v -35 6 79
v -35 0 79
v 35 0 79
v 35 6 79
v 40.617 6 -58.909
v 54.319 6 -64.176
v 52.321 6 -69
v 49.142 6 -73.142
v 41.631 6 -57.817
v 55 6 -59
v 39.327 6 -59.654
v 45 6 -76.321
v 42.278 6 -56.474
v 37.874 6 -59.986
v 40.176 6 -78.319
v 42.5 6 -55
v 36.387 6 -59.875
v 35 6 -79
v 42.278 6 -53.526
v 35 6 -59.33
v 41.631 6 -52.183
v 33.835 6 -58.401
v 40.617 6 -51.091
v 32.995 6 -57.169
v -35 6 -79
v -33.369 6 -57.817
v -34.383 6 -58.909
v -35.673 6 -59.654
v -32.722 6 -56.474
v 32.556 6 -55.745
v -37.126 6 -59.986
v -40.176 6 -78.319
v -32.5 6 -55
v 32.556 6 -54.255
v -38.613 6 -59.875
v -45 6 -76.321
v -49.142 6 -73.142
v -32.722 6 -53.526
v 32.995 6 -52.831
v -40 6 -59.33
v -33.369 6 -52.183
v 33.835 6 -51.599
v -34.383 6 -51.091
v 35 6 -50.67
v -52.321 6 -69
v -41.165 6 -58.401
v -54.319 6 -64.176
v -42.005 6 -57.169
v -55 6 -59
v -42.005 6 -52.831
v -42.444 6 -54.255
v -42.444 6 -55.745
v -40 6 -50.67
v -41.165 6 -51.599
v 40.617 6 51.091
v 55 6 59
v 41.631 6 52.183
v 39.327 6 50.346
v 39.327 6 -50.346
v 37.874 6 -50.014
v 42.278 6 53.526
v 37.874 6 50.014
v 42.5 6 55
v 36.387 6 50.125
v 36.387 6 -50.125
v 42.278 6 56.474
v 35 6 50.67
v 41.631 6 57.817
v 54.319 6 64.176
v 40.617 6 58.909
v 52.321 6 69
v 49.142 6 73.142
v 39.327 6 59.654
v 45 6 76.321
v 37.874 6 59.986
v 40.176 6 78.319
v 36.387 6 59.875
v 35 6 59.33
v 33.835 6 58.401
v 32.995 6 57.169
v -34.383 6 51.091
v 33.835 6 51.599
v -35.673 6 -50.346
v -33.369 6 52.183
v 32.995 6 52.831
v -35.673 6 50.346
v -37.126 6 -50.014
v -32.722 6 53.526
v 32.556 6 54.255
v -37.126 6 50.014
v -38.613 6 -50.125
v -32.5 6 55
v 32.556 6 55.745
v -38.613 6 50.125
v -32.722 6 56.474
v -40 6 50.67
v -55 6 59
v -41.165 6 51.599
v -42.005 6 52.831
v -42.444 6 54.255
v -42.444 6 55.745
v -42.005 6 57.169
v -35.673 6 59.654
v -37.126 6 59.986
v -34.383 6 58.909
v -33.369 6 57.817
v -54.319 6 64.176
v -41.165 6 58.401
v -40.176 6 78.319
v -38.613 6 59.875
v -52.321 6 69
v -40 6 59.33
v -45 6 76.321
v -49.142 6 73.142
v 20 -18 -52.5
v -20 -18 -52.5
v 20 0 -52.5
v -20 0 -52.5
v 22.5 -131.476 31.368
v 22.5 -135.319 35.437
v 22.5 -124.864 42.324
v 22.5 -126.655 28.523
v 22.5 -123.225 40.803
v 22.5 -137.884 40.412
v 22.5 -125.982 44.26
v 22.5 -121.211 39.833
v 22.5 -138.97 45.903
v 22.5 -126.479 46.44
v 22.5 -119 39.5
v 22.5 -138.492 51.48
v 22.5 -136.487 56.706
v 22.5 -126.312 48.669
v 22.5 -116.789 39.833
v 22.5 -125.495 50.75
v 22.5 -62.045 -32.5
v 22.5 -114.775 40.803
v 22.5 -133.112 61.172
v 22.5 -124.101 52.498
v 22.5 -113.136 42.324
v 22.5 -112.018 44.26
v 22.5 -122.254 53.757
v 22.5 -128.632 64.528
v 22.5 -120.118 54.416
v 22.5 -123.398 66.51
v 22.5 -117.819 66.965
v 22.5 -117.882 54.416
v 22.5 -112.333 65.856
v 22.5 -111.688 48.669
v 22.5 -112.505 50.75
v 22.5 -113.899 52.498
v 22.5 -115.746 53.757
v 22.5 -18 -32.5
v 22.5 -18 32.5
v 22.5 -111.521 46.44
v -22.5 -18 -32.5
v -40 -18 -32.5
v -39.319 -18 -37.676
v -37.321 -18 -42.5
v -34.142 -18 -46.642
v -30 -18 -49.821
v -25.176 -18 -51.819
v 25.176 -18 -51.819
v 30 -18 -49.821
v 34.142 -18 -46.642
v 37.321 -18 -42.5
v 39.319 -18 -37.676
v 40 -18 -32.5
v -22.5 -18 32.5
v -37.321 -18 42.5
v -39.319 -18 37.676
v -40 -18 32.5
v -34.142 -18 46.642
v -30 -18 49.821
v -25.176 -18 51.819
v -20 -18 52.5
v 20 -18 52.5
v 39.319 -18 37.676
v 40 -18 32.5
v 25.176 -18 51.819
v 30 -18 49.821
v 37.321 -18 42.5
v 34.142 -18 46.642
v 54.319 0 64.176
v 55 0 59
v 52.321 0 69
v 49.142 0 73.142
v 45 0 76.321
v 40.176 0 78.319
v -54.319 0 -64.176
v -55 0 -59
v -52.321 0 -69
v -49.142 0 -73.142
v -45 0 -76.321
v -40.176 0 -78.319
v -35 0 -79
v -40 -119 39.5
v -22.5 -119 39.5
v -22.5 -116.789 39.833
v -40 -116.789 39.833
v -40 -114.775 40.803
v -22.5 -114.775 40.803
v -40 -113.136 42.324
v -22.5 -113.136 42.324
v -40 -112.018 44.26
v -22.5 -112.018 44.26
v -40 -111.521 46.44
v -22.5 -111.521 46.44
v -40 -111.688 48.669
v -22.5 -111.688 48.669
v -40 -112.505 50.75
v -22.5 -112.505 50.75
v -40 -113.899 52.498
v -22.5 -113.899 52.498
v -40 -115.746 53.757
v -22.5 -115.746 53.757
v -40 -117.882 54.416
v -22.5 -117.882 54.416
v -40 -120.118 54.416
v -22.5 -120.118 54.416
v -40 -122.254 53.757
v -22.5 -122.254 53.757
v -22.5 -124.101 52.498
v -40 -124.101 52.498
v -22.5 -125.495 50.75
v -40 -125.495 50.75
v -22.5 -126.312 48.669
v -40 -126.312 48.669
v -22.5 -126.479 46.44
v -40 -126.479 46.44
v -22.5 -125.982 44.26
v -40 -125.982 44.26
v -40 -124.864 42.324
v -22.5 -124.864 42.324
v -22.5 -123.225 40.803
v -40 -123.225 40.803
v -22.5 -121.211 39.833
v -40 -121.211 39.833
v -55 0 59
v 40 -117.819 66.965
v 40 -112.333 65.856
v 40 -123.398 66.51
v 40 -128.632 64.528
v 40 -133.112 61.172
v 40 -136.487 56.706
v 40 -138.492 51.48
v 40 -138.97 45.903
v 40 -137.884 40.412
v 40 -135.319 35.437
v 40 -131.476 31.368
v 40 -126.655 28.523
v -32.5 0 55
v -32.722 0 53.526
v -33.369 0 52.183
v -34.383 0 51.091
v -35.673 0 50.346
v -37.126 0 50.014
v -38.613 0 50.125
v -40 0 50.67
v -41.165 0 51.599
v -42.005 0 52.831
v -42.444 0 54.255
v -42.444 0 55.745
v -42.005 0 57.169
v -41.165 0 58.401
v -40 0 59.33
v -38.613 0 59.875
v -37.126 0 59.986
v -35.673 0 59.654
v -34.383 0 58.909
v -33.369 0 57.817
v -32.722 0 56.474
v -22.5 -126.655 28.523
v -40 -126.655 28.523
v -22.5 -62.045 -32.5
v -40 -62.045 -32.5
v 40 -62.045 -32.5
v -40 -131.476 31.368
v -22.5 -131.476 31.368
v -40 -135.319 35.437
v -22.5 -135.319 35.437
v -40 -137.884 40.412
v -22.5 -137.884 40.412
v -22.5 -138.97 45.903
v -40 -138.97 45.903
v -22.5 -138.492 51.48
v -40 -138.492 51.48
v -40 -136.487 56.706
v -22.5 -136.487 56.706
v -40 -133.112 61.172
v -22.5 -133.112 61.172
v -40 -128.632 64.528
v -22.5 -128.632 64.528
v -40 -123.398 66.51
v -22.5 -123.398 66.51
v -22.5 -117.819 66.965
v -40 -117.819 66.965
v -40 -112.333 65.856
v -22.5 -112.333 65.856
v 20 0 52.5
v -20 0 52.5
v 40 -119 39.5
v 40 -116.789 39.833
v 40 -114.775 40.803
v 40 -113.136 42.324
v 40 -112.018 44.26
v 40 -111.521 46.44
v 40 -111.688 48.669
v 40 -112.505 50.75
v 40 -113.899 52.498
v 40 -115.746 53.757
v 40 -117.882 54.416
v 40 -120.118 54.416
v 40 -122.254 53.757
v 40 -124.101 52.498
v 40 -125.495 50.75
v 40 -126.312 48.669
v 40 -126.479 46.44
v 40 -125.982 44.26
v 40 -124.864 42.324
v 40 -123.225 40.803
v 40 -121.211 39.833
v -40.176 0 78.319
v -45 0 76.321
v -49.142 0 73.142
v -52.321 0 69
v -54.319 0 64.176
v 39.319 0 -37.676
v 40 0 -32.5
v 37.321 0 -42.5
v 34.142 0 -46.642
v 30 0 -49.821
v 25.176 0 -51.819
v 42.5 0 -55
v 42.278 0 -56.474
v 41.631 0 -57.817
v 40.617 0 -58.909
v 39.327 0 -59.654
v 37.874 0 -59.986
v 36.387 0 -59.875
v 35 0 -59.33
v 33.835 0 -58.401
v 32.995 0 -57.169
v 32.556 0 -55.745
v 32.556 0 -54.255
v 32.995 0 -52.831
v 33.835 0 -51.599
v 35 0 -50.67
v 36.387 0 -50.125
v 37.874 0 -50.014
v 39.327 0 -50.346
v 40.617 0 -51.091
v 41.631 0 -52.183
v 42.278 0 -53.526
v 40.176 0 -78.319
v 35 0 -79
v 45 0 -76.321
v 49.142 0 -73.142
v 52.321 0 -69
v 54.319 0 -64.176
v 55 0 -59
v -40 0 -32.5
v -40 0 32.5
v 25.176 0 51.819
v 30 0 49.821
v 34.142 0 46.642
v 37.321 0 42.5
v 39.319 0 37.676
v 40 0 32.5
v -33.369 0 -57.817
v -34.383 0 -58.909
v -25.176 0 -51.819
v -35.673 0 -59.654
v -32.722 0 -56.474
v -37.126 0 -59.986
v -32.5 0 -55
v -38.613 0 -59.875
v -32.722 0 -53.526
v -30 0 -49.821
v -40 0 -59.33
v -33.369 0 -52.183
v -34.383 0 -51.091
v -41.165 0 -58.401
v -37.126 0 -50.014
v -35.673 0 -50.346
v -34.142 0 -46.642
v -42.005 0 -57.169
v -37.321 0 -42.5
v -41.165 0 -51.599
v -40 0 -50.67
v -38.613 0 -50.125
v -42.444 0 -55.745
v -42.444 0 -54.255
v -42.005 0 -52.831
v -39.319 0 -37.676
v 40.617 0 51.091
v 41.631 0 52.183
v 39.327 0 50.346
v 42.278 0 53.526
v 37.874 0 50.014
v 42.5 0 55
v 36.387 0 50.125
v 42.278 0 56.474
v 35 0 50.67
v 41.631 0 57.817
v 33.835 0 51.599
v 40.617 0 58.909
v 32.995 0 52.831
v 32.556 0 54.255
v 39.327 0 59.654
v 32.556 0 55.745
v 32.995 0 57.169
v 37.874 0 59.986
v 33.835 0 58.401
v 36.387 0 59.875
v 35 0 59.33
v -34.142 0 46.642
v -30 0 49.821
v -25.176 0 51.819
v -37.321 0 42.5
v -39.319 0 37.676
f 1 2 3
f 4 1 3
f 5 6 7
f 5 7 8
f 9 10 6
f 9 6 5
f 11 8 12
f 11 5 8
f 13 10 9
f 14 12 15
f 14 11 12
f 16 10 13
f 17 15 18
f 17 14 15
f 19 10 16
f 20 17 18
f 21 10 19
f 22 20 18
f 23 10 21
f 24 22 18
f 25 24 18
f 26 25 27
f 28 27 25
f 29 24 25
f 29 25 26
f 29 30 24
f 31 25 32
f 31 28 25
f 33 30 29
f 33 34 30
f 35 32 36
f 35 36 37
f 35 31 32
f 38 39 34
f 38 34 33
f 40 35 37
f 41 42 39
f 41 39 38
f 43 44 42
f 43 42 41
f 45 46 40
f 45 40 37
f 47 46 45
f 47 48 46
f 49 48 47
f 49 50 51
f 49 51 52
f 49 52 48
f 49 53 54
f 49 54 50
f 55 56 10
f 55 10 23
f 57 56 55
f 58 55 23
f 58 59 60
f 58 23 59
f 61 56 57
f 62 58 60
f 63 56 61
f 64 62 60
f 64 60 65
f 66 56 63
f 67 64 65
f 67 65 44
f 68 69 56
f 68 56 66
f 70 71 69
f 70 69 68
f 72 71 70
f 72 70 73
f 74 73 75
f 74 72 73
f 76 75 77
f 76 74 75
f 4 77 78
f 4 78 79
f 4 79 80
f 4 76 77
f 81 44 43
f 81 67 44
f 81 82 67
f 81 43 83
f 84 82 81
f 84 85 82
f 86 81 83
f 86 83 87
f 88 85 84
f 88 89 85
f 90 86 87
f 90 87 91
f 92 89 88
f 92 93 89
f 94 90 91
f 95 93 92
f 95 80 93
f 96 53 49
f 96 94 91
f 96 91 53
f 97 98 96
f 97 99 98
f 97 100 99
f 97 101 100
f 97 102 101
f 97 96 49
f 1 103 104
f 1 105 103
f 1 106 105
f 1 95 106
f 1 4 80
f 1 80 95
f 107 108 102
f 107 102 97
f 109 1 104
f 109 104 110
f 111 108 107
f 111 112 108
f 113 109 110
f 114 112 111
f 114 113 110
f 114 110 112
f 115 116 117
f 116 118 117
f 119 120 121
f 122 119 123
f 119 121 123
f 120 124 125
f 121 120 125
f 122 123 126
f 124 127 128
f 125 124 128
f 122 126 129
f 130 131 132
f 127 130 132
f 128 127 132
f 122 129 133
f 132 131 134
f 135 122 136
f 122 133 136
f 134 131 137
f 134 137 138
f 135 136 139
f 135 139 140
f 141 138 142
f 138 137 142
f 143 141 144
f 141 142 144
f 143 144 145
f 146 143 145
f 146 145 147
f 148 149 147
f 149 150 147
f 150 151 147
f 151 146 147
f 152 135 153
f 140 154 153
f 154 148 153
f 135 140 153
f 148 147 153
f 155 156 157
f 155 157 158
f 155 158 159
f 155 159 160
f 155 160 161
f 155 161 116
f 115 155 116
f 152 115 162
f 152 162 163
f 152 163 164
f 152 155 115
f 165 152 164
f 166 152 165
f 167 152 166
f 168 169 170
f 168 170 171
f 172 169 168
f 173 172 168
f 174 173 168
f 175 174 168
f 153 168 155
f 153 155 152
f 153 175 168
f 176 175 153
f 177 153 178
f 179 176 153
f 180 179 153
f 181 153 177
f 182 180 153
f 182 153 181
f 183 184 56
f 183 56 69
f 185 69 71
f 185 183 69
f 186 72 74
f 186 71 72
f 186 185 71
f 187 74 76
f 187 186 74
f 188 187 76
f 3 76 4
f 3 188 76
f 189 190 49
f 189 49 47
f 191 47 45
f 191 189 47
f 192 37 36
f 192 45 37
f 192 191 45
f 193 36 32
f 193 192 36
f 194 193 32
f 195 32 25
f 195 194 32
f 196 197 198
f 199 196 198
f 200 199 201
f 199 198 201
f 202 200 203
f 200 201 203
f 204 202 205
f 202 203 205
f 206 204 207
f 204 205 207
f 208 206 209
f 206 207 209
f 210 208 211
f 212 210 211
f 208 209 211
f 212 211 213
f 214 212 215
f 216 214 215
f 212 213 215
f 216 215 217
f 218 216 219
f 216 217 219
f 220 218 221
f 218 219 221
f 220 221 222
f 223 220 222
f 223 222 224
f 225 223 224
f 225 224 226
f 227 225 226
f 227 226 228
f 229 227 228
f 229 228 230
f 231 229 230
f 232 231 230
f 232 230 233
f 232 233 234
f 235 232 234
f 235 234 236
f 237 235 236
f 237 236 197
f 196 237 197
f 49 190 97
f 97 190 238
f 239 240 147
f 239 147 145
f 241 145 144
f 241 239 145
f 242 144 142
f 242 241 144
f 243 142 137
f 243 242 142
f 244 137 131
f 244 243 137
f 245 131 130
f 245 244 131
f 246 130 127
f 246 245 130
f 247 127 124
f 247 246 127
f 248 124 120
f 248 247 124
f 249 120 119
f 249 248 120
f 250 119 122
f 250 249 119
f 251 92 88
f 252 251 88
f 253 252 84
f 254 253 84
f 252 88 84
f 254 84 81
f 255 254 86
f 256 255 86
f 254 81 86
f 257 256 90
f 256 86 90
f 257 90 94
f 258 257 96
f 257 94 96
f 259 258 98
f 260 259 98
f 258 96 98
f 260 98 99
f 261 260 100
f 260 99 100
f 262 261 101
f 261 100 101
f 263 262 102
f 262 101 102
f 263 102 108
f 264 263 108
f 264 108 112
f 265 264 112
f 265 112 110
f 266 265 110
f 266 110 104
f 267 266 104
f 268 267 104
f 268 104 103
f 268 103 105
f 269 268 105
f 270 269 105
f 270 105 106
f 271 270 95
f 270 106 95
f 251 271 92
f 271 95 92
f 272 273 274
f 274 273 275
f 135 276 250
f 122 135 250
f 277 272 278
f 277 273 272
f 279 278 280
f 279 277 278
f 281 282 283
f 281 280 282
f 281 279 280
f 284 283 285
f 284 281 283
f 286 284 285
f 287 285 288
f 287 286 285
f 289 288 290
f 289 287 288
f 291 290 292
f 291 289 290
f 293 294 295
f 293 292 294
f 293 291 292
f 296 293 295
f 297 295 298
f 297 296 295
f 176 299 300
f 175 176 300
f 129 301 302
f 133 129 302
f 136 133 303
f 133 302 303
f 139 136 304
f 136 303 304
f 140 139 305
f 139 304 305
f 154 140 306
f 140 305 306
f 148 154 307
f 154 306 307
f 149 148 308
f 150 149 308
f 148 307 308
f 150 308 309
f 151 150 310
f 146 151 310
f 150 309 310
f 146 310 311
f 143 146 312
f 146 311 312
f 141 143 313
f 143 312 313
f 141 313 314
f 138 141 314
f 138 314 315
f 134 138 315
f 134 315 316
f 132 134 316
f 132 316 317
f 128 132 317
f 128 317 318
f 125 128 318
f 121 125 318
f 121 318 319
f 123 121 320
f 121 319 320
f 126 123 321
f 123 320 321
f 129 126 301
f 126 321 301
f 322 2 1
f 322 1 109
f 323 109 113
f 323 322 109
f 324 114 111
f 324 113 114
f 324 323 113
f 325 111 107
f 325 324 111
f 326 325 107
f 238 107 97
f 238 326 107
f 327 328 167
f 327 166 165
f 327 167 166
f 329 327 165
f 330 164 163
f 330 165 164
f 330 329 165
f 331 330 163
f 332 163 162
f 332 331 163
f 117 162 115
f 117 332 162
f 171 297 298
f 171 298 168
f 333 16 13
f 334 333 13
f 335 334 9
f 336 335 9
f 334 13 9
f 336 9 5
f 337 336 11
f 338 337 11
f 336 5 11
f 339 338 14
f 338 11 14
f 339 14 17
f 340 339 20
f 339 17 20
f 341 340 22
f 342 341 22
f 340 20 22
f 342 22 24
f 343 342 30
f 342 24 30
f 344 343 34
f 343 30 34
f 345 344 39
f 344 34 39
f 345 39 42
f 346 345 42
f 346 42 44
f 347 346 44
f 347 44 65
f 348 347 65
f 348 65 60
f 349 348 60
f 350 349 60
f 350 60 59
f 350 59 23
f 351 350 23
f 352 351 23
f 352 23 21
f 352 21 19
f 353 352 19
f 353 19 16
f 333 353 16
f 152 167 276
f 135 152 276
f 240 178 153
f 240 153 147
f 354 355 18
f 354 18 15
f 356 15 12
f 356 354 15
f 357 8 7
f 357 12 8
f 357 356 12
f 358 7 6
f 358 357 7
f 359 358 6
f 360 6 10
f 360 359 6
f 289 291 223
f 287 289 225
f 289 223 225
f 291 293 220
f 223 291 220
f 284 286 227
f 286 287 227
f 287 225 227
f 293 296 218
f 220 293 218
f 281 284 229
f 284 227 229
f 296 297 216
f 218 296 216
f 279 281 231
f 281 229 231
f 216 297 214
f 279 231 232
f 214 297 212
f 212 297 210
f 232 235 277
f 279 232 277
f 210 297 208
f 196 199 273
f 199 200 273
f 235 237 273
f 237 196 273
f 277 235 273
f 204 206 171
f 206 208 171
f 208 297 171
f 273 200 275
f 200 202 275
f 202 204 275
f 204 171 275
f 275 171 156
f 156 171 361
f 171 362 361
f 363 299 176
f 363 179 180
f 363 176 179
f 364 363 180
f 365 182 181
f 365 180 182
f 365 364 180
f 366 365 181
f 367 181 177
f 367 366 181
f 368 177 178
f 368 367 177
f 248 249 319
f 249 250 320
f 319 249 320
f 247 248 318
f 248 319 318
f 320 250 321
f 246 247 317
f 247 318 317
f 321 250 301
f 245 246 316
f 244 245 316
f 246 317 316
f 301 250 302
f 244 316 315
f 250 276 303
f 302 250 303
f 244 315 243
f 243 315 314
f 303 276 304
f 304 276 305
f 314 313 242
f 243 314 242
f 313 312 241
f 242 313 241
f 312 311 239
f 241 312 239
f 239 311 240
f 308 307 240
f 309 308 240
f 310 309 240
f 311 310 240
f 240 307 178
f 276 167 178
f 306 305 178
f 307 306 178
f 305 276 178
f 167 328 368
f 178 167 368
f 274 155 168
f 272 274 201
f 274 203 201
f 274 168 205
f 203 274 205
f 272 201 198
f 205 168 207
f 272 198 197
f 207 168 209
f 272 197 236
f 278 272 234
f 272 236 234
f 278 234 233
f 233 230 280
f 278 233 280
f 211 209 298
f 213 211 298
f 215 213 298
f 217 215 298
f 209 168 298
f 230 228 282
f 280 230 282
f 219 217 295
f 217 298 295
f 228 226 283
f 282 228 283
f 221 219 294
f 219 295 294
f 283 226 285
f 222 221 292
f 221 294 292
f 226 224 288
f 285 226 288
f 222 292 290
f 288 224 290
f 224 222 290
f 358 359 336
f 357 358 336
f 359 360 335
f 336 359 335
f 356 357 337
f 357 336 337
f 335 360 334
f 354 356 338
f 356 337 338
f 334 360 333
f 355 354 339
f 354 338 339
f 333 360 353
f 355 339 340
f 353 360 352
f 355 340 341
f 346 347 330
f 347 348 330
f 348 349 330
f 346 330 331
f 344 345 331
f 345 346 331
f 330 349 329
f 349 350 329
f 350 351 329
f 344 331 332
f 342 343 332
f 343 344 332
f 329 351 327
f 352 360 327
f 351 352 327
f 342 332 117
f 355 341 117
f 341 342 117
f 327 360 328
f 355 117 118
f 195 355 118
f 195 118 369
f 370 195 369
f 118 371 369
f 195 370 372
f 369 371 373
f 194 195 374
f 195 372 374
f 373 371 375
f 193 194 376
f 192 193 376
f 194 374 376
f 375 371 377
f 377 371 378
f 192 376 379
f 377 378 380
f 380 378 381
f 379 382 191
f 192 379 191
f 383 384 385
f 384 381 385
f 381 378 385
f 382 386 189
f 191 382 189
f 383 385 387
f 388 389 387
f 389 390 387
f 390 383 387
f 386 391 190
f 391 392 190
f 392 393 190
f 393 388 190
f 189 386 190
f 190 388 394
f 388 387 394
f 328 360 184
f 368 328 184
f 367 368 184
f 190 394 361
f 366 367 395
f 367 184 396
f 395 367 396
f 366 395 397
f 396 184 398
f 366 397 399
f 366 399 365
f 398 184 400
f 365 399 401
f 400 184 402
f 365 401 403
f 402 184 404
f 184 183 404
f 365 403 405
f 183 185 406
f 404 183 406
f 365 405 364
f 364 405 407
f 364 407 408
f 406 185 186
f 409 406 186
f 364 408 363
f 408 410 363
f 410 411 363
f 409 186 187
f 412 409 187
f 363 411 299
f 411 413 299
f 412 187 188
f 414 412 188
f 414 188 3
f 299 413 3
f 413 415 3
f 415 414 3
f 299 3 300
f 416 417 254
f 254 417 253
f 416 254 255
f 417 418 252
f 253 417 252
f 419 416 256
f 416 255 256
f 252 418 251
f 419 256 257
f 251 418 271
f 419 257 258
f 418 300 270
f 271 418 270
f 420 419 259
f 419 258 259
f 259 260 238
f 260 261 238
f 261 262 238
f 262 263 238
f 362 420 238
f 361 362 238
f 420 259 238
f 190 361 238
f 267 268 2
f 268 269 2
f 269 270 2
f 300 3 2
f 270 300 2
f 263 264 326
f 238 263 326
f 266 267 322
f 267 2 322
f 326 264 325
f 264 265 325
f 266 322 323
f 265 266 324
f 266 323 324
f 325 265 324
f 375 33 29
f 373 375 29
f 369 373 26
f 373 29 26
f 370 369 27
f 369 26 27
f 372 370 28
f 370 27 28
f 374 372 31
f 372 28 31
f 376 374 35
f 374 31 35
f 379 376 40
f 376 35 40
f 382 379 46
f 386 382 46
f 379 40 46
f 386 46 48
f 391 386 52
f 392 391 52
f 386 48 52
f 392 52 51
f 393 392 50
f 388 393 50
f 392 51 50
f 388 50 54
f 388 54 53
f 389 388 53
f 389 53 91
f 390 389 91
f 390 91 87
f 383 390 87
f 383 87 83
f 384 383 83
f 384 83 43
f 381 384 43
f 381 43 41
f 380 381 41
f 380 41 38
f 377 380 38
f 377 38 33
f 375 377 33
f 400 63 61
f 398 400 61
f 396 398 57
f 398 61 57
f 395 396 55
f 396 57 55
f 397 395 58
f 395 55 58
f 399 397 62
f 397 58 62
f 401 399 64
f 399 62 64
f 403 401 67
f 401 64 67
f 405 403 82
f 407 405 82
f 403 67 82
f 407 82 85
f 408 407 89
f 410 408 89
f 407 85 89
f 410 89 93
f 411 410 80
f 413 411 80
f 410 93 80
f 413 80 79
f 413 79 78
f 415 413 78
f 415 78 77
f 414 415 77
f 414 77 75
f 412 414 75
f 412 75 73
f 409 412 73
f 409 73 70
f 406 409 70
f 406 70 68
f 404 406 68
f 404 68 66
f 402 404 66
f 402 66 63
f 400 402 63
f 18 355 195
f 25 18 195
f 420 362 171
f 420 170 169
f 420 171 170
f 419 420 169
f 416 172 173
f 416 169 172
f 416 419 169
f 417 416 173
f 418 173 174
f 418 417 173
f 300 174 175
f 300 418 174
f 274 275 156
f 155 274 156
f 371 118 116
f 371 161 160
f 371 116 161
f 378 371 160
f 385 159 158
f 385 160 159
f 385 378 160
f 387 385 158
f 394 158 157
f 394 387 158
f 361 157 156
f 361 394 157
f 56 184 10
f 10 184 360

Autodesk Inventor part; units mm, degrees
ref_plane "XZ Plane" through (0, 0, 0) normal (0, 1, 0) x (-1, 0, 0)
ref_plane "XY Plane" through (0, 0, 0) normal (0, 0, 1) x (1, 0, 0)
sketch "Sketch1" plane through (0, 0, 0) normal (0, 1, 0) x (-1, 0, 0)
  line L0 (-35, -79) -> (35, -79)
  line L1 (55, -59) -> (55, 59)
  line L2 (35, 79) -> (-35, 79)
  line L3 (-55, 59) -> (-55, -59)
  line L4 (-55, -79) -> (55, 79) construction
  line L5 (55, -79) -> (-55, 79) construction
  arc A0 (55, 59) -> (35, 79) centre (35, 59) ccw
  arc A1 (-35, 79) -> (-55, 59) centre (-35, 59) ccw
  arc A2 (-55, -59) -> (-35, -79) centre (-35, -59) ccw
  arc A3 (35, -79) -> (55, -59) centre (35, -59) ccw
  point P0 (0, 0)
  dimension "d0" = 158
  dimension "d1" = 110
  dimension "d2" = 20
extrude "Extrusion1" add sketch "Sketch1" along normal blind 6
sketch "Sketch2" plane through (0, 0, 0) normal (0, -1, 0) x (1, 0, 0)
  line L0 (-55, -52.5) -> (55, 52.5) construction
  line L1 (55, -52.5) -> (-55, 52.5) construction
  line L2 (90.8825, 0) -> (-87.3629, 0)
  line L3 (0, 94.4084) -> (0, -106.3516)
  line L4 (-20, -52.5) -> (20, -52.5)
  line L5 (40, -32.5) -> (40, 32.5)
  line L6 (20, 52.5) -> (-20, 52.5)
  line L7 (-40, 32.5) -> (-40, -32.5)
  line L8 (-40, -52.5) -> (40, 52.5) construction
  line L9 (40, -52.5) -> (-40, 52.5) construction
  line L10 (40, 52.5) -> (41.9971, 52.5)
  line L11 (40, -52.5) -> (41.9971, -52.5)
  line L12 (40, 52.5) -> (40, 71.6594)
  line L13 (40, -52.5) -> (40, -69.6689)
  arc A0 (40, 32.5) -> (20, 52.5) centre (20, 32.5) ccw
  arc A1 (-20, 52.5) -> (-40, 32.5) centre (-20, 32.5) ccw
  arc A2 (-40, -32.5) -> (-20, -52.5) centre (-20, -32.5) ccw
  arc A3 (20, -52.5) -> (40, -32.5) centre (20, -32.5) ccw
  point P0 (0, 0)
  dimension "d23" = 52.5
  dimension "d25" = 40
  dimension "d26" = 20
extrude "Extrusion2" add sketch "Sketch2" along normal blind 18
sketch "Sketch3" plane through (0, 6, 0) normal (0, 1, 0) x (1, 0, 0)
  circle A0 centre (-37.5, -55) radius 5
  circle A1 centre (37.5, -55) radius 5
  line L0 (-35.6722, 52.5) -> (-19.5402, 52.5)
  line L1 (0, 83.5001) -> (0, -85.7722)
  line L2 (-75.2069, 0) -> (80.66, 0)
  line L3 (-37.5, -55) -> (37.5, -55)
  line L4 (-37.5, -55) -> (-37.5, -56.2391)
  line L5 (37.5, -55) -> (37.5, -56.2391)
  circle A2 centre (-37.5, 55) radius 5
  circle A3 centre (37.5, 55) radius 5
  point P0 (0, 0)
  dimension "d15" = 37.5
  dimension "d16" = 37.5
  dimension "d17" = 55
  dimension "d20" = 10
  dimension "d21" = 10
extrude "Extrusion3" cut sketch "Sketch3" against normal blind 6
ref_plane "Work Plane1" through (40, 0, 0) normal (1, 0, 0) x (0, 1, 0)
sketch "Sketch4" plane through (40, 0, 0) normal (1, 0, 0) x (0, 1, 0)
  arc A0 (-112.3326, 65.8559) -> (-126.6551, 28.523) centre (-119, 47) ccw
  circle A1 centre (-119, 47) radius 62.5
  line L0 (-18, -32.5) -> (-18, 32.5) projected
  line L1 (6, 59) -> (6, -59) projected
  line L2 (63.9503, 0) -> (-247.3631, 0)
  line L3 (-119, 47) -> (-214.4005, 47)
  line L4 (-18, -32.5) -> (-62.0453, -32.5)
  line L5 (-18, 32.5) -> (-18, -32.5)
  line L6 (-18, 32.5) -> (-112.3326, 65.8559)
  line L7 (-62.0453, -32.5) -> (-126.6551, 28.523)
  point P0 (0, 0)
  point P1 (-131.6551, 40.5657)
  dimension "d28" = 40
  dimension "d29" = 125
  dimension "d30" = 125
  dimension "d31" = 47
extrude "Extrusion4" add sketch "Sketch4" against normal blind 17.5 contours L6 A1 L2 L7 A0 | L6 L0 L2 A1 | L2 L0 L4 L7 A1 | A1 L7 L2 picked at (-85.1463, -0.9198)
mirror "Mirror1" about plane through (0, 0, 0) normal (1, 0, 0) of "Extrusion4"
sketch "Sketch5" plane through (40, 0, 32.5) normal (1, 0, 0) x (0, 0, -1)
  arc A0 (-33.3559, -112.3326) -> (3.977, -126.6551) centre (-14.5, -119) ccw projected
  circle A1 centre (-14.5, -119) radius 7.5
  point P0 (32.5, 0)
  dimension "d35" = 15
extrude "Extrusion5" cut sketch "Sketch5" against normal through all
properties part number "Plate2" material "Polyethylene, High Density"
